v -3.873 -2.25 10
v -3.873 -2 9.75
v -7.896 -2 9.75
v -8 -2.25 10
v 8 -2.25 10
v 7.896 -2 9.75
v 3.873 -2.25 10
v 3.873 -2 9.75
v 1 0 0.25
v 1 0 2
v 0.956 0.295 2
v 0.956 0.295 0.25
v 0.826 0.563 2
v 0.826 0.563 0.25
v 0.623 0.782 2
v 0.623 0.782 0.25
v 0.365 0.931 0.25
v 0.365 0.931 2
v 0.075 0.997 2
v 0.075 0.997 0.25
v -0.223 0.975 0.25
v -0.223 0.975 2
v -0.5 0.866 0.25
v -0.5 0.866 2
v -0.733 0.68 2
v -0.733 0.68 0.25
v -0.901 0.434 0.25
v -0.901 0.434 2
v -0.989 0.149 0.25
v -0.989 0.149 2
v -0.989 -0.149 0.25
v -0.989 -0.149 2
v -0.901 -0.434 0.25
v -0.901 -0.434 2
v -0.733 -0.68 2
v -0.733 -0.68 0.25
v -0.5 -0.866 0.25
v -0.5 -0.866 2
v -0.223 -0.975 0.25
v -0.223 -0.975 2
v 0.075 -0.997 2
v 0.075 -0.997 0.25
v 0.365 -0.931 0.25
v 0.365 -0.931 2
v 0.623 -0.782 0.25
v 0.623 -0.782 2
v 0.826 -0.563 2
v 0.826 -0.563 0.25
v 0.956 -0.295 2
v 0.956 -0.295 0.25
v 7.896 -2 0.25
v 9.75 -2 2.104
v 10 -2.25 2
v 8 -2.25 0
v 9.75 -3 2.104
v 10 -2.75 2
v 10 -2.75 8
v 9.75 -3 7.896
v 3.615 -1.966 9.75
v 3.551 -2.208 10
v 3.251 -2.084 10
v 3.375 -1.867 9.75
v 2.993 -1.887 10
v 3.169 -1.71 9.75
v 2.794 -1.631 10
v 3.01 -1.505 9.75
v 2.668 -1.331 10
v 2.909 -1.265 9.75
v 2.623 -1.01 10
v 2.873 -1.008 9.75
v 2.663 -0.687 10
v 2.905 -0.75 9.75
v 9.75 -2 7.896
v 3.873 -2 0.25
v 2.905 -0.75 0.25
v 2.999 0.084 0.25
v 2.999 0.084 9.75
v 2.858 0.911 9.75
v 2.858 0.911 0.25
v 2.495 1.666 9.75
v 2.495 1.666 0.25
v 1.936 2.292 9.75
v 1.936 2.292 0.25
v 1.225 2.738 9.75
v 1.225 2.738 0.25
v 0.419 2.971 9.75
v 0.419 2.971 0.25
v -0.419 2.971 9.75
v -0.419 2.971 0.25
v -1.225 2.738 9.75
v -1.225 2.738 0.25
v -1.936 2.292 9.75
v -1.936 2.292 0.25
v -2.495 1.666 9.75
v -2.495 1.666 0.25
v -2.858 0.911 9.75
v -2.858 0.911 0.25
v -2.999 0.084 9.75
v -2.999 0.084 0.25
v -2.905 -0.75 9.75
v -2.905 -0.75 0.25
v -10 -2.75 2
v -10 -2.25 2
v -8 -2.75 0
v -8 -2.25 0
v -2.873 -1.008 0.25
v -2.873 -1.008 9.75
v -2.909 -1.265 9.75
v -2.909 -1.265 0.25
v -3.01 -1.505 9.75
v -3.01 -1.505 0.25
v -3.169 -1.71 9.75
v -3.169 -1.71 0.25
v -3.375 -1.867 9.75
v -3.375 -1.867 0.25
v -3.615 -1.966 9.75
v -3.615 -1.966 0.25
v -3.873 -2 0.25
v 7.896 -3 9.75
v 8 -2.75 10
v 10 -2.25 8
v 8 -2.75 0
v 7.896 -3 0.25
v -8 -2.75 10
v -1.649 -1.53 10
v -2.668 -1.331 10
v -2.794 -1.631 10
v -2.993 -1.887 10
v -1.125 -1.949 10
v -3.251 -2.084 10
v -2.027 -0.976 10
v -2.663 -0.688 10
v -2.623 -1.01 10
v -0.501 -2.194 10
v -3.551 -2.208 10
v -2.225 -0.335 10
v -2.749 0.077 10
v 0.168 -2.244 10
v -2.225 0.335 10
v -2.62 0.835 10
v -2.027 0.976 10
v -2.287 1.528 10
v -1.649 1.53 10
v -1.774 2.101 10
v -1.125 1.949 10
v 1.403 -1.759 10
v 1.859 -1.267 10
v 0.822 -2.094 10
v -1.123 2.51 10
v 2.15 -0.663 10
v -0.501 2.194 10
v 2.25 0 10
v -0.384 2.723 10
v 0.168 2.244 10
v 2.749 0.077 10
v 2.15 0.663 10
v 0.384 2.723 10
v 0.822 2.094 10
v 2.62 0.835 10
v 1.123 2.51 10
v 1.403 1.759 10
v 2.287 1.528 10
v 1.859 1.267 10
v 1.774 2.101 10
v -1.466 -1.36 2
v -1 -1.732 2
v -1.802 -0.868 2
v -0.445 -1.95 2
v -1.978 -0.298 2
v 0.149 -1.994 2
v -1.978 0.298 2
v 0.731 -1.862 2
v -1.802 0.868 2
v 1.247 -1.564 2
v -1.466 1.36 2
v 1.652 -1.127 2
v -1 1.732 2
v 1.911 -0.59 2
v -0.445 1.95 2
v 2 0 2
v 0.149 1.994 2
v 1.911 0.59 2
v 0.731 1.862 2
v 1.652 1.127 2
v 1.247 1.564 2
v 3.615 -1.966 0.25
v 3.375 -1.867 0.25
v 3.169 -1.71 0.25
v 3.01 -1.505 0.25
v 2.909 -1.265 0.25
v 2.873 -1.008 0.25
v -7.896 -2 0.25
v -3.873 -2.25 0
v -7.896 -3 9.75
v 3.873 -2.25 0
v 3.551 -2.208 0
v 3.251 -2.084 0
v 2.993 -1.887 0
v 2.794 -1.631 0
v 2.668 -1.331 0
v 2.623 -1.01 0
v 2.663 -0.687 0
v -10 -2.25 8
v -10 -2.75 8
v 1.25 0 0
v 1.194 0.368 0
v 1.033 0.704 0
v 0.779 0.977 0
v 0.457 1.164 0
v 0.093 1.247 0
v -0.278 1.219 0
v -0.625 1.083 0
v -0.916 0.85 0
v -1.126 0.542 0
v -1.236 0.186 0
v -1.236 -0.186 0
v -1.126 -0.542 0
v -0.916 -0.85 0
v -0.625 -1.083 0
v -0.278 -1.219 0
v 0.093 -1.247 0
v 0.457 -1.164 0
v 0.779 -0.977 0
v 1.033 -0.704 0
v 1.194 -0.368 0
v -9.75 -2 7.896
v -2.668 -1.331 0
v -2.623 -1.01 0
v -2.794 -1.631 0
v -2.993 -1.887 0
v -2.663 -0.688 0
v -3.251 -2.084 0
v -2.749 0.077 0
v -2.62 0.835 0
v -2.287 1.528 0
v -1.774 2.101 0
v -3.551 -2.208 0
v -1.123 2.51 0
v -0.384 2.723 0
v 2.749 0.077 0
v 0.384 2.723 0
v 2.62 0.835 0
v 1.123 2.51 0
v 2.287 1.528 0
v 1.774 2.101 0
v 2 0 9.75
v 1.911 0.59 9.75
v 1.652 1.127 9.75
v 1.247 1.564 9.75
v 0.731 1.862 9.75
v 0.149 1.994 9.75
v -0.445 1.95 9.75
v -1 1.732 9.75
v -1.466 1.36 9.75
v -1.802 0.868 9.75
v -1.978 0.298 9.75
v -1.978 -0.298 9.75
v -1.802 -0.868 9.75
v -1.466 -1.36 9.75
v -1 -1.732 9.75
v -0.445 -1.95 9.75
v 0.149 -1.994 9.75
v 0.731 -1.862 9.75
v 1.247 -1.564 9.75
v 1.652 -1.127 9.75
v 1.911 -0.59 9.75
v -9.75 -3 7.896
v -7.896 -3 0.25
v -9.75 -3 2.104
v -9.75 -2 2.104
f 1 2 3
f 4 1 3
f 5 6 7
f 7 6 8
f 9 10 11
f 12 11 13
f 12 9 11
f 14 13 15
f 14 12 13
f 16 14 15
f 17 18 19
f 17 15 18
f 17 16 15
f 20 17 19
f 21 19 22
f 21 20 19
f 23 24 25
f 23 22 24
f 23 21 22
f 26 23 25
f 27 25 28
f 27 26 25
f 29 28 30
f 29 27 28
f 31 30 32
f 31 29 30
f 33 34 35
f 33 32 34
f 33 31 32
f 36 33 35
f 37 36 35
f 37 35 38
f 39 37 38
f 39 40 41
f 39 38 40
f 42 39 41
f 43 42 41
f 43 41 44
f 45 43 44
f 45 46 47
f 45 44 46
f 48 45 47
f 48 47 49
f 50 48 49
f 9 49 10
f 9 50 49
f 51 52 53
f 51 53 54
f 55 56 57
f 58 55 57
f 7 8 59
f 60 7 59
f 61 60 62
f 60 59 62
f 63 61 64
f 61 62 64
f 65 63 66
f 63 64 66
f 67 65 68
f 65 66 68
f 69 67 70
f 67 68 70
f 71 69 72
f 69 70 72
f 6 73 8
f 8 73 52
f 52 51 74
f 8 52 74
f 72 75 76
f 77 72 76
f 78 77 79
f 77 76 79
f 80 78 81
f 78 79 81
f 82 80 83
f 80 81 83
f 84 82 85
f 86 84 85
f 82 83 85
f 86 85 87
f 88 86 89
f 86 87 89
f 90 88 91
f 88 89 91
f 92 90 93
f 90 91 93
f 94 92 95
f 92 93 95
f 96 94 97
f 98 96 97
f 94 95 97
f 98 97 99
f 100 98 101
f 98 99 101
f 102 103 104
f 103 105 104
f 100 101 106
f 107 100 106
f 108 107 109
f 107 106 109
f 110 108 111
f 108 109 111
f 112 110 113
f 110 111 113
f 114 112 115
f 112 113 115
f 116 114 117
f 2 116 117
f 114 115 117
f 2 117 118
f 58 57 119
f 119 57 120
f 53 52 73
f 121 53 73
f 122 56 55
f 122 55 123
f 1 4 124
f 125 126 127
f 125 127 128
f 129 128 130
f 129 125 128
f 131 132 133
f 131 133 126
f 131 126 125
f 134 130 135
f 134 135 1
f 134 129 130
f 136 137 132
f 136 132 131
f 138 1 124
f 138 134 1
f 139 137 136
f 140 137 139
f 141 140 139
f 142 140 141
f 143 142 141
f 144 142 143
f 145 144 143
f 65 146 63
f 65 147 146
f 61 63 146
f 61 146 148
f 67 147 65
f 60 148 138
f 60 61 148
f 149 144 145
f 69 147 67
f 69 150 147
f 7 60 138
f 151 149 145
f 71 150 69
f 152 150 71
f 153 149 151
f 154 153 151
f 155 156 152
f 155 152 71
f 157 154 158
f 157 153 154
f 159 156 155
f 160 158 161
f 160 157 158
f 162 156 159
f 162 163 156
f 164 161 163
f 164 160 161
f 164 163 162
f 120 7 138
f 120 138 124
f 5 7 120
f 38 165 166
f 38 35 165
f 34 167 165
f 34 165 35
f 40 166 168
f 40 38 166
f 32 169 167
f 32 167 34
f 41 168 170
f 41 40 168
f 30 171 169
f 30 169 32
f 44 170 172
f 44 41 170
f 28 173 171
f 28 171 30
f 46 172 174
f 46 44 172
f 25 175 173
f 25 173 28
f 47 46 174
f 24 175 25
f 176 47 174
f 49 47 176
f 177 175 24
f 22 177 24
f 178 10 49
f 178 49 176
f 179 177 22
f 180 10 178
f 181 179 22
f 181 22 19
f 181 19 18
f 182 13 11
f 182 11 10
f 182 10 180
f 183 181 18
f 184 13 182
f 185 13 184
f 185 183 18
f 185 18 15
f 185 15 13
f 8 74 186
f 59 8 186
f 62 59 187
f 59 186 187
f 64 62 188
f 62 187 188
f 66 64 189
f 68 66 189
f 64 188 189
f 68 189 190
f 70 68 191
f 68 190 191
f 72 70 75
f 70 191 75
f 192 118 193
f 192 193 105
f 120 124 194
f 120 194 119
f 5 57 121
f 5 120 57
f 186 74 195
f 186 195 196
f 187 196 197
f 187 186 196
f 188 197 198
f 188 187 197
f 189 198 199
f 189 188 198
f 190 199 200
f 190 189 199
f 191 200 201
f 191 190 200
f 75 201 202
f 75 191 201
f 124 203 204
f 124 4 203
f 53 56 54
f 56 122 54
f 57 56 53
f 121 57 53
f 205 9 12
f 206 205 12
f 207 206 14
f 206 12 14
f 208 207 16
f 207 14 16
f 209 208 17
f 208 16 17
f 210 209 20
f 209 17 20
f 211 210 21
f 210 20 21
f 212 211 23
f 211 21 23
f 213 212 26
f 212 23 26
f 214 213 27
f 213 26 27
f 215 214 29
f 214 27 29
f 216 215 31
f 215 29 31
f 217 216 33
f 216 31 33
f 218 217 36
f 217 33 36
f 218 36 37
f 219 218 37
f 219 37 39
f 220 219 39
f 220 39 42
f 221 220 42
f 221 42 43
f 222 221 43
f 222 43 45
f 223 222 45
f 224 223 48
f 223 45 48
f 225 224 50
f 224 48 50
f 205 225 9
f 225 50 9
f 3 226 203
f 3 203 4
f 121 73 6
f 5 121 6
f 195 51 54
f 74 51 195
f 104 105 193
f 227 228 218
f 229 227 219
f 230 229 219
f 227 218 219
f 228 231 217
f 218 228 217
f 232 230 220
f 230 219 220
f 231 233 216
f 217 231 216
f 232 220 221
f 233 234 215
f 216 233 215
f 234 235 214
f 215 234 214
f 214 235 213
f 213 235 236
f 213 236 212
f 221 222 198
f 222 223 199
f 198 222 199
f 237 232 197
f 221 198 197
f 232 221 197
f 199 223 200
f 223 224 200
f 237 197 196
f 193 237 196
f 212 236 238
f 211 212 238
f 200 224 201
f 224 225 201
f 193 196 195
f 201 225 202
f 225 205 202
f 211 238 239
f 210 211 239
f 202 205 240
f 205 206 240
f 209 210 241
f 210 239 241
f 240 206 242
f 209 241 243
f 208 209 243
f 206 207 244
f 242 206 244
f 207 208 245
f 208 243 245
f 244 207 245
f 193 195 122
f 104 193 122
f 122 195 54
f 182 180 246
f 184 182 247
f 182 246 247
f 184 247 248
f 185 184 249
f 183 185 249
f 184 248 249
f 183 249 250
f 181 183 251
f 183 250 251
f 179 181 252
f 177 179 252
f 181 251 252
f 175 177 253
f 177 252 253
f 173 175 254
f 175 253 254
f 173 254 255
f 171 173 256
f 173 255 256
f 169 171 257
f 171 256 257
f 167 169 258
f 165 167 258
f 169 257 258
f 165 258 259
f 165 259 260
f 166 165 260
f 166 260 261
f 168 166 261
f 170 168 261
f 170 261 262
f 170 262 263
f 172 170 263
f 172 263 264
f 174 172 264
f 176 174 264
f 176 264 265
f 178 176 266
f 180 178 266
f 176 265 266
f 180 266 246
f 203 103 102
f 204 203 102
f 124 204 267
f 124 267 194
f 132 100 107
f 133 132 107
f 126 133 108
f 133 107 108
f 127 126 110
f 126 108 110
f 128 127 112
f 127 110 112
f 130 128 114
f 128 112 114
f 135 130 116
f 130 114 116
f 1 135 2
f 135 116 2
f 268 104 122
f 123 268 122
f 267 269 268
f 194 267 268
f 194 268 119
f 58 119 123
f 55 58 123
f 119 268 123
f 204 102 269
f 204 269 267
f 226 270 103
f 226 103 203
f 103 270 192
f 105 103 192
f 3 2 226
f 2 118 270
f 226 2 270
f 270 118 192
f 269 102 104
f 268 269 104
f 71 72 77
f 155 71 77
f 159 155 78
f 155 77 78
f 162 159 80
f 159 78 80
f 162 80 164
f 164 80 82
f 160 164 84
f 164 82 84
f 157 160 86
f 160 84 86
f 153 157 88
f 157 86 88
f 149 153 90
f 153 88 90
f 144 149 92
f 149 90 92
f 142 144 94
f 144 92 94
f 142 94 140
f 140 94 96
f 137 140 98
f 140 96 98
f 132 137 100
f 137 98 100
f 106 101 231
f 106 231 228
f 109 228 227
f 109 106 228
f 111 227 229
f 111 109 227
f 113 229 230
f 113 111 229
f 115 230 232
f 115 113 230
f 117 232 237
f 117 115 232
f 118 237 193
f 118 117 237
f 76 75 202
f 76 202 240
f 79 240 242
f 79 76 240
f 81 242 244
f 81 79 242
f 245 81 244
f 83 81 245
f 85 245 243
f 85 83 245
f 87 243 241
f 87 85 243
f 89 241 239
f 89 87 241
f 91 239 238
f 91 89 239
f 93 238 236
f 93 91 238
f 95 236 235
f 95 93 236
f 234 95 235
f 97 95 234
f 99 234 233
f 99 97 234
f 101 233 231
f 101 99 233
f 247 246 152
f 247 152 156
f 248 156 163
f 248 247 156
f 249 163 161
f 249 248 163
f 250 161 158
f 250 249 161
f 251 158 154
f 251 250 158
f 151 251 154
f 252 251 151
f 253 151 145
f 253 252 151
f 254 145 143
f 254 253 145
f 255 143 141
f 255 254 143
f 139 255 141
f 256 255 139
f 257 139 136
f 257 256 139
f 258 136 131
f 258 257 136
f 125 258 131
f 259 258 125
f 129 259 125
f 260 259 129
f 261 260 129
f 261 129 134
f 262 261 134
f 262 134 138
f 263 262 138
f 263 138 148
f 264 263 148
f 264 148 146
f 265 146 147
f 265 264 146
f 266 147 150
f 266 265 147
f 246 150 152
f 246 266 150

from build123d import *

# Parameters (mm, degrees)
ESQUISSE1_R             = 1
BOSS_EXTRU_1_DEPTH      = 10
ESQUISSE2_R             = 2
ENL_V_MAT_EXTRU_1_DEPTH = 8
CHANFREIN1_SIZE         = 2
CHANFREIN2_SIZE         = 0.25


with BuildPart() as part:
    # Esquisse1 → Boss.-Extru.1 (new body)
    with BuildSketch(Plane.XY):
        with BuildLine():
            Line((-10, -3), (10, -3))
            Line((10, -3), (10, -2))
            Line((10, -2), (3.872983346, -2))
            ThreePointArc((3.872983346, -2), (3.082413931, -1.612372436), (2.90473751, -0.75))
            ThreePointArc((2.90473751, -0.75), (0, 3), (-2.90473751, -0.75))
            ThreePointArc((-2.90473751, -0.75), (-3.082413931, -1.612372436), (-3.872983346, -2))
            Line((-3.872983346, -2), (-10, -2))
            Line((-10, -2), (-10, -3))
        make_face()
        Circle(ESQUISSE1_R, mode=Mode.SUBTRACT)
    extrude(amount=BOSS_EXTRU_1_DEPTH)

    # Esquisse2 → Enlèv. mat.-Extru.1 (cut)
    with BuildSketch(Plane.XY.offset(10)):
        Circle(ESQUISSE2_R)
    extrude(amount=-ENL_V_MAT_EXTRU_1_DEPTH, mode=Mode.SUBTRACT)

    # Chanfrein1
    chanfrein1_edges = [part.edges().sort_by_distance(p)[0] for p in [
        (-10, -2.5, 10),
        (10, -2.5, 10),
        (10, -2.5, 0),
        (-10, -2.5, 0),
    ]]
    chamfer(chanfrein1_edges, length=CHANFREIN1_SIZE)

    # Chanfrein2
    chanfrein2_edges = [part.edges().sort_by_distance(p)[0] for p in [
        (-5.936491673, -2, 0),
        (-3.082413931, -1.612372436, 0),
        (-1, 0, 0),
        (3.082413931, -1.612372436, 10),
        (0, 3, 10),
        (-2, 0, 10),
        (0, -3, 10),
        (5.936491673, -2, 10),
        (0, -3, 0),
        (10, -3, 5),
        (-10, -3, 5),
        (9, -3, 9),
        (9, -3, 1),
        (-9, -3, 1),
        (-9, -3, 9),
        (-10, -2, 5),
        (-3.082413931, -1.612372436, 10),
        (-9, -2, 1),
        (-9, -2, 9),
        (5.936491673, -2, 0),
        (10, -2, 5),
        (9, -2, 9),
        (9, -2, 1),
        (-5.936491673, -2, 10),
        (0, 3, 0),
        (3.082413931, -1.612372436, 0),
    ]]
    chamfer(chanfrein2_edges, length=CHANFREIN2_SIZE)


solid = part.part
